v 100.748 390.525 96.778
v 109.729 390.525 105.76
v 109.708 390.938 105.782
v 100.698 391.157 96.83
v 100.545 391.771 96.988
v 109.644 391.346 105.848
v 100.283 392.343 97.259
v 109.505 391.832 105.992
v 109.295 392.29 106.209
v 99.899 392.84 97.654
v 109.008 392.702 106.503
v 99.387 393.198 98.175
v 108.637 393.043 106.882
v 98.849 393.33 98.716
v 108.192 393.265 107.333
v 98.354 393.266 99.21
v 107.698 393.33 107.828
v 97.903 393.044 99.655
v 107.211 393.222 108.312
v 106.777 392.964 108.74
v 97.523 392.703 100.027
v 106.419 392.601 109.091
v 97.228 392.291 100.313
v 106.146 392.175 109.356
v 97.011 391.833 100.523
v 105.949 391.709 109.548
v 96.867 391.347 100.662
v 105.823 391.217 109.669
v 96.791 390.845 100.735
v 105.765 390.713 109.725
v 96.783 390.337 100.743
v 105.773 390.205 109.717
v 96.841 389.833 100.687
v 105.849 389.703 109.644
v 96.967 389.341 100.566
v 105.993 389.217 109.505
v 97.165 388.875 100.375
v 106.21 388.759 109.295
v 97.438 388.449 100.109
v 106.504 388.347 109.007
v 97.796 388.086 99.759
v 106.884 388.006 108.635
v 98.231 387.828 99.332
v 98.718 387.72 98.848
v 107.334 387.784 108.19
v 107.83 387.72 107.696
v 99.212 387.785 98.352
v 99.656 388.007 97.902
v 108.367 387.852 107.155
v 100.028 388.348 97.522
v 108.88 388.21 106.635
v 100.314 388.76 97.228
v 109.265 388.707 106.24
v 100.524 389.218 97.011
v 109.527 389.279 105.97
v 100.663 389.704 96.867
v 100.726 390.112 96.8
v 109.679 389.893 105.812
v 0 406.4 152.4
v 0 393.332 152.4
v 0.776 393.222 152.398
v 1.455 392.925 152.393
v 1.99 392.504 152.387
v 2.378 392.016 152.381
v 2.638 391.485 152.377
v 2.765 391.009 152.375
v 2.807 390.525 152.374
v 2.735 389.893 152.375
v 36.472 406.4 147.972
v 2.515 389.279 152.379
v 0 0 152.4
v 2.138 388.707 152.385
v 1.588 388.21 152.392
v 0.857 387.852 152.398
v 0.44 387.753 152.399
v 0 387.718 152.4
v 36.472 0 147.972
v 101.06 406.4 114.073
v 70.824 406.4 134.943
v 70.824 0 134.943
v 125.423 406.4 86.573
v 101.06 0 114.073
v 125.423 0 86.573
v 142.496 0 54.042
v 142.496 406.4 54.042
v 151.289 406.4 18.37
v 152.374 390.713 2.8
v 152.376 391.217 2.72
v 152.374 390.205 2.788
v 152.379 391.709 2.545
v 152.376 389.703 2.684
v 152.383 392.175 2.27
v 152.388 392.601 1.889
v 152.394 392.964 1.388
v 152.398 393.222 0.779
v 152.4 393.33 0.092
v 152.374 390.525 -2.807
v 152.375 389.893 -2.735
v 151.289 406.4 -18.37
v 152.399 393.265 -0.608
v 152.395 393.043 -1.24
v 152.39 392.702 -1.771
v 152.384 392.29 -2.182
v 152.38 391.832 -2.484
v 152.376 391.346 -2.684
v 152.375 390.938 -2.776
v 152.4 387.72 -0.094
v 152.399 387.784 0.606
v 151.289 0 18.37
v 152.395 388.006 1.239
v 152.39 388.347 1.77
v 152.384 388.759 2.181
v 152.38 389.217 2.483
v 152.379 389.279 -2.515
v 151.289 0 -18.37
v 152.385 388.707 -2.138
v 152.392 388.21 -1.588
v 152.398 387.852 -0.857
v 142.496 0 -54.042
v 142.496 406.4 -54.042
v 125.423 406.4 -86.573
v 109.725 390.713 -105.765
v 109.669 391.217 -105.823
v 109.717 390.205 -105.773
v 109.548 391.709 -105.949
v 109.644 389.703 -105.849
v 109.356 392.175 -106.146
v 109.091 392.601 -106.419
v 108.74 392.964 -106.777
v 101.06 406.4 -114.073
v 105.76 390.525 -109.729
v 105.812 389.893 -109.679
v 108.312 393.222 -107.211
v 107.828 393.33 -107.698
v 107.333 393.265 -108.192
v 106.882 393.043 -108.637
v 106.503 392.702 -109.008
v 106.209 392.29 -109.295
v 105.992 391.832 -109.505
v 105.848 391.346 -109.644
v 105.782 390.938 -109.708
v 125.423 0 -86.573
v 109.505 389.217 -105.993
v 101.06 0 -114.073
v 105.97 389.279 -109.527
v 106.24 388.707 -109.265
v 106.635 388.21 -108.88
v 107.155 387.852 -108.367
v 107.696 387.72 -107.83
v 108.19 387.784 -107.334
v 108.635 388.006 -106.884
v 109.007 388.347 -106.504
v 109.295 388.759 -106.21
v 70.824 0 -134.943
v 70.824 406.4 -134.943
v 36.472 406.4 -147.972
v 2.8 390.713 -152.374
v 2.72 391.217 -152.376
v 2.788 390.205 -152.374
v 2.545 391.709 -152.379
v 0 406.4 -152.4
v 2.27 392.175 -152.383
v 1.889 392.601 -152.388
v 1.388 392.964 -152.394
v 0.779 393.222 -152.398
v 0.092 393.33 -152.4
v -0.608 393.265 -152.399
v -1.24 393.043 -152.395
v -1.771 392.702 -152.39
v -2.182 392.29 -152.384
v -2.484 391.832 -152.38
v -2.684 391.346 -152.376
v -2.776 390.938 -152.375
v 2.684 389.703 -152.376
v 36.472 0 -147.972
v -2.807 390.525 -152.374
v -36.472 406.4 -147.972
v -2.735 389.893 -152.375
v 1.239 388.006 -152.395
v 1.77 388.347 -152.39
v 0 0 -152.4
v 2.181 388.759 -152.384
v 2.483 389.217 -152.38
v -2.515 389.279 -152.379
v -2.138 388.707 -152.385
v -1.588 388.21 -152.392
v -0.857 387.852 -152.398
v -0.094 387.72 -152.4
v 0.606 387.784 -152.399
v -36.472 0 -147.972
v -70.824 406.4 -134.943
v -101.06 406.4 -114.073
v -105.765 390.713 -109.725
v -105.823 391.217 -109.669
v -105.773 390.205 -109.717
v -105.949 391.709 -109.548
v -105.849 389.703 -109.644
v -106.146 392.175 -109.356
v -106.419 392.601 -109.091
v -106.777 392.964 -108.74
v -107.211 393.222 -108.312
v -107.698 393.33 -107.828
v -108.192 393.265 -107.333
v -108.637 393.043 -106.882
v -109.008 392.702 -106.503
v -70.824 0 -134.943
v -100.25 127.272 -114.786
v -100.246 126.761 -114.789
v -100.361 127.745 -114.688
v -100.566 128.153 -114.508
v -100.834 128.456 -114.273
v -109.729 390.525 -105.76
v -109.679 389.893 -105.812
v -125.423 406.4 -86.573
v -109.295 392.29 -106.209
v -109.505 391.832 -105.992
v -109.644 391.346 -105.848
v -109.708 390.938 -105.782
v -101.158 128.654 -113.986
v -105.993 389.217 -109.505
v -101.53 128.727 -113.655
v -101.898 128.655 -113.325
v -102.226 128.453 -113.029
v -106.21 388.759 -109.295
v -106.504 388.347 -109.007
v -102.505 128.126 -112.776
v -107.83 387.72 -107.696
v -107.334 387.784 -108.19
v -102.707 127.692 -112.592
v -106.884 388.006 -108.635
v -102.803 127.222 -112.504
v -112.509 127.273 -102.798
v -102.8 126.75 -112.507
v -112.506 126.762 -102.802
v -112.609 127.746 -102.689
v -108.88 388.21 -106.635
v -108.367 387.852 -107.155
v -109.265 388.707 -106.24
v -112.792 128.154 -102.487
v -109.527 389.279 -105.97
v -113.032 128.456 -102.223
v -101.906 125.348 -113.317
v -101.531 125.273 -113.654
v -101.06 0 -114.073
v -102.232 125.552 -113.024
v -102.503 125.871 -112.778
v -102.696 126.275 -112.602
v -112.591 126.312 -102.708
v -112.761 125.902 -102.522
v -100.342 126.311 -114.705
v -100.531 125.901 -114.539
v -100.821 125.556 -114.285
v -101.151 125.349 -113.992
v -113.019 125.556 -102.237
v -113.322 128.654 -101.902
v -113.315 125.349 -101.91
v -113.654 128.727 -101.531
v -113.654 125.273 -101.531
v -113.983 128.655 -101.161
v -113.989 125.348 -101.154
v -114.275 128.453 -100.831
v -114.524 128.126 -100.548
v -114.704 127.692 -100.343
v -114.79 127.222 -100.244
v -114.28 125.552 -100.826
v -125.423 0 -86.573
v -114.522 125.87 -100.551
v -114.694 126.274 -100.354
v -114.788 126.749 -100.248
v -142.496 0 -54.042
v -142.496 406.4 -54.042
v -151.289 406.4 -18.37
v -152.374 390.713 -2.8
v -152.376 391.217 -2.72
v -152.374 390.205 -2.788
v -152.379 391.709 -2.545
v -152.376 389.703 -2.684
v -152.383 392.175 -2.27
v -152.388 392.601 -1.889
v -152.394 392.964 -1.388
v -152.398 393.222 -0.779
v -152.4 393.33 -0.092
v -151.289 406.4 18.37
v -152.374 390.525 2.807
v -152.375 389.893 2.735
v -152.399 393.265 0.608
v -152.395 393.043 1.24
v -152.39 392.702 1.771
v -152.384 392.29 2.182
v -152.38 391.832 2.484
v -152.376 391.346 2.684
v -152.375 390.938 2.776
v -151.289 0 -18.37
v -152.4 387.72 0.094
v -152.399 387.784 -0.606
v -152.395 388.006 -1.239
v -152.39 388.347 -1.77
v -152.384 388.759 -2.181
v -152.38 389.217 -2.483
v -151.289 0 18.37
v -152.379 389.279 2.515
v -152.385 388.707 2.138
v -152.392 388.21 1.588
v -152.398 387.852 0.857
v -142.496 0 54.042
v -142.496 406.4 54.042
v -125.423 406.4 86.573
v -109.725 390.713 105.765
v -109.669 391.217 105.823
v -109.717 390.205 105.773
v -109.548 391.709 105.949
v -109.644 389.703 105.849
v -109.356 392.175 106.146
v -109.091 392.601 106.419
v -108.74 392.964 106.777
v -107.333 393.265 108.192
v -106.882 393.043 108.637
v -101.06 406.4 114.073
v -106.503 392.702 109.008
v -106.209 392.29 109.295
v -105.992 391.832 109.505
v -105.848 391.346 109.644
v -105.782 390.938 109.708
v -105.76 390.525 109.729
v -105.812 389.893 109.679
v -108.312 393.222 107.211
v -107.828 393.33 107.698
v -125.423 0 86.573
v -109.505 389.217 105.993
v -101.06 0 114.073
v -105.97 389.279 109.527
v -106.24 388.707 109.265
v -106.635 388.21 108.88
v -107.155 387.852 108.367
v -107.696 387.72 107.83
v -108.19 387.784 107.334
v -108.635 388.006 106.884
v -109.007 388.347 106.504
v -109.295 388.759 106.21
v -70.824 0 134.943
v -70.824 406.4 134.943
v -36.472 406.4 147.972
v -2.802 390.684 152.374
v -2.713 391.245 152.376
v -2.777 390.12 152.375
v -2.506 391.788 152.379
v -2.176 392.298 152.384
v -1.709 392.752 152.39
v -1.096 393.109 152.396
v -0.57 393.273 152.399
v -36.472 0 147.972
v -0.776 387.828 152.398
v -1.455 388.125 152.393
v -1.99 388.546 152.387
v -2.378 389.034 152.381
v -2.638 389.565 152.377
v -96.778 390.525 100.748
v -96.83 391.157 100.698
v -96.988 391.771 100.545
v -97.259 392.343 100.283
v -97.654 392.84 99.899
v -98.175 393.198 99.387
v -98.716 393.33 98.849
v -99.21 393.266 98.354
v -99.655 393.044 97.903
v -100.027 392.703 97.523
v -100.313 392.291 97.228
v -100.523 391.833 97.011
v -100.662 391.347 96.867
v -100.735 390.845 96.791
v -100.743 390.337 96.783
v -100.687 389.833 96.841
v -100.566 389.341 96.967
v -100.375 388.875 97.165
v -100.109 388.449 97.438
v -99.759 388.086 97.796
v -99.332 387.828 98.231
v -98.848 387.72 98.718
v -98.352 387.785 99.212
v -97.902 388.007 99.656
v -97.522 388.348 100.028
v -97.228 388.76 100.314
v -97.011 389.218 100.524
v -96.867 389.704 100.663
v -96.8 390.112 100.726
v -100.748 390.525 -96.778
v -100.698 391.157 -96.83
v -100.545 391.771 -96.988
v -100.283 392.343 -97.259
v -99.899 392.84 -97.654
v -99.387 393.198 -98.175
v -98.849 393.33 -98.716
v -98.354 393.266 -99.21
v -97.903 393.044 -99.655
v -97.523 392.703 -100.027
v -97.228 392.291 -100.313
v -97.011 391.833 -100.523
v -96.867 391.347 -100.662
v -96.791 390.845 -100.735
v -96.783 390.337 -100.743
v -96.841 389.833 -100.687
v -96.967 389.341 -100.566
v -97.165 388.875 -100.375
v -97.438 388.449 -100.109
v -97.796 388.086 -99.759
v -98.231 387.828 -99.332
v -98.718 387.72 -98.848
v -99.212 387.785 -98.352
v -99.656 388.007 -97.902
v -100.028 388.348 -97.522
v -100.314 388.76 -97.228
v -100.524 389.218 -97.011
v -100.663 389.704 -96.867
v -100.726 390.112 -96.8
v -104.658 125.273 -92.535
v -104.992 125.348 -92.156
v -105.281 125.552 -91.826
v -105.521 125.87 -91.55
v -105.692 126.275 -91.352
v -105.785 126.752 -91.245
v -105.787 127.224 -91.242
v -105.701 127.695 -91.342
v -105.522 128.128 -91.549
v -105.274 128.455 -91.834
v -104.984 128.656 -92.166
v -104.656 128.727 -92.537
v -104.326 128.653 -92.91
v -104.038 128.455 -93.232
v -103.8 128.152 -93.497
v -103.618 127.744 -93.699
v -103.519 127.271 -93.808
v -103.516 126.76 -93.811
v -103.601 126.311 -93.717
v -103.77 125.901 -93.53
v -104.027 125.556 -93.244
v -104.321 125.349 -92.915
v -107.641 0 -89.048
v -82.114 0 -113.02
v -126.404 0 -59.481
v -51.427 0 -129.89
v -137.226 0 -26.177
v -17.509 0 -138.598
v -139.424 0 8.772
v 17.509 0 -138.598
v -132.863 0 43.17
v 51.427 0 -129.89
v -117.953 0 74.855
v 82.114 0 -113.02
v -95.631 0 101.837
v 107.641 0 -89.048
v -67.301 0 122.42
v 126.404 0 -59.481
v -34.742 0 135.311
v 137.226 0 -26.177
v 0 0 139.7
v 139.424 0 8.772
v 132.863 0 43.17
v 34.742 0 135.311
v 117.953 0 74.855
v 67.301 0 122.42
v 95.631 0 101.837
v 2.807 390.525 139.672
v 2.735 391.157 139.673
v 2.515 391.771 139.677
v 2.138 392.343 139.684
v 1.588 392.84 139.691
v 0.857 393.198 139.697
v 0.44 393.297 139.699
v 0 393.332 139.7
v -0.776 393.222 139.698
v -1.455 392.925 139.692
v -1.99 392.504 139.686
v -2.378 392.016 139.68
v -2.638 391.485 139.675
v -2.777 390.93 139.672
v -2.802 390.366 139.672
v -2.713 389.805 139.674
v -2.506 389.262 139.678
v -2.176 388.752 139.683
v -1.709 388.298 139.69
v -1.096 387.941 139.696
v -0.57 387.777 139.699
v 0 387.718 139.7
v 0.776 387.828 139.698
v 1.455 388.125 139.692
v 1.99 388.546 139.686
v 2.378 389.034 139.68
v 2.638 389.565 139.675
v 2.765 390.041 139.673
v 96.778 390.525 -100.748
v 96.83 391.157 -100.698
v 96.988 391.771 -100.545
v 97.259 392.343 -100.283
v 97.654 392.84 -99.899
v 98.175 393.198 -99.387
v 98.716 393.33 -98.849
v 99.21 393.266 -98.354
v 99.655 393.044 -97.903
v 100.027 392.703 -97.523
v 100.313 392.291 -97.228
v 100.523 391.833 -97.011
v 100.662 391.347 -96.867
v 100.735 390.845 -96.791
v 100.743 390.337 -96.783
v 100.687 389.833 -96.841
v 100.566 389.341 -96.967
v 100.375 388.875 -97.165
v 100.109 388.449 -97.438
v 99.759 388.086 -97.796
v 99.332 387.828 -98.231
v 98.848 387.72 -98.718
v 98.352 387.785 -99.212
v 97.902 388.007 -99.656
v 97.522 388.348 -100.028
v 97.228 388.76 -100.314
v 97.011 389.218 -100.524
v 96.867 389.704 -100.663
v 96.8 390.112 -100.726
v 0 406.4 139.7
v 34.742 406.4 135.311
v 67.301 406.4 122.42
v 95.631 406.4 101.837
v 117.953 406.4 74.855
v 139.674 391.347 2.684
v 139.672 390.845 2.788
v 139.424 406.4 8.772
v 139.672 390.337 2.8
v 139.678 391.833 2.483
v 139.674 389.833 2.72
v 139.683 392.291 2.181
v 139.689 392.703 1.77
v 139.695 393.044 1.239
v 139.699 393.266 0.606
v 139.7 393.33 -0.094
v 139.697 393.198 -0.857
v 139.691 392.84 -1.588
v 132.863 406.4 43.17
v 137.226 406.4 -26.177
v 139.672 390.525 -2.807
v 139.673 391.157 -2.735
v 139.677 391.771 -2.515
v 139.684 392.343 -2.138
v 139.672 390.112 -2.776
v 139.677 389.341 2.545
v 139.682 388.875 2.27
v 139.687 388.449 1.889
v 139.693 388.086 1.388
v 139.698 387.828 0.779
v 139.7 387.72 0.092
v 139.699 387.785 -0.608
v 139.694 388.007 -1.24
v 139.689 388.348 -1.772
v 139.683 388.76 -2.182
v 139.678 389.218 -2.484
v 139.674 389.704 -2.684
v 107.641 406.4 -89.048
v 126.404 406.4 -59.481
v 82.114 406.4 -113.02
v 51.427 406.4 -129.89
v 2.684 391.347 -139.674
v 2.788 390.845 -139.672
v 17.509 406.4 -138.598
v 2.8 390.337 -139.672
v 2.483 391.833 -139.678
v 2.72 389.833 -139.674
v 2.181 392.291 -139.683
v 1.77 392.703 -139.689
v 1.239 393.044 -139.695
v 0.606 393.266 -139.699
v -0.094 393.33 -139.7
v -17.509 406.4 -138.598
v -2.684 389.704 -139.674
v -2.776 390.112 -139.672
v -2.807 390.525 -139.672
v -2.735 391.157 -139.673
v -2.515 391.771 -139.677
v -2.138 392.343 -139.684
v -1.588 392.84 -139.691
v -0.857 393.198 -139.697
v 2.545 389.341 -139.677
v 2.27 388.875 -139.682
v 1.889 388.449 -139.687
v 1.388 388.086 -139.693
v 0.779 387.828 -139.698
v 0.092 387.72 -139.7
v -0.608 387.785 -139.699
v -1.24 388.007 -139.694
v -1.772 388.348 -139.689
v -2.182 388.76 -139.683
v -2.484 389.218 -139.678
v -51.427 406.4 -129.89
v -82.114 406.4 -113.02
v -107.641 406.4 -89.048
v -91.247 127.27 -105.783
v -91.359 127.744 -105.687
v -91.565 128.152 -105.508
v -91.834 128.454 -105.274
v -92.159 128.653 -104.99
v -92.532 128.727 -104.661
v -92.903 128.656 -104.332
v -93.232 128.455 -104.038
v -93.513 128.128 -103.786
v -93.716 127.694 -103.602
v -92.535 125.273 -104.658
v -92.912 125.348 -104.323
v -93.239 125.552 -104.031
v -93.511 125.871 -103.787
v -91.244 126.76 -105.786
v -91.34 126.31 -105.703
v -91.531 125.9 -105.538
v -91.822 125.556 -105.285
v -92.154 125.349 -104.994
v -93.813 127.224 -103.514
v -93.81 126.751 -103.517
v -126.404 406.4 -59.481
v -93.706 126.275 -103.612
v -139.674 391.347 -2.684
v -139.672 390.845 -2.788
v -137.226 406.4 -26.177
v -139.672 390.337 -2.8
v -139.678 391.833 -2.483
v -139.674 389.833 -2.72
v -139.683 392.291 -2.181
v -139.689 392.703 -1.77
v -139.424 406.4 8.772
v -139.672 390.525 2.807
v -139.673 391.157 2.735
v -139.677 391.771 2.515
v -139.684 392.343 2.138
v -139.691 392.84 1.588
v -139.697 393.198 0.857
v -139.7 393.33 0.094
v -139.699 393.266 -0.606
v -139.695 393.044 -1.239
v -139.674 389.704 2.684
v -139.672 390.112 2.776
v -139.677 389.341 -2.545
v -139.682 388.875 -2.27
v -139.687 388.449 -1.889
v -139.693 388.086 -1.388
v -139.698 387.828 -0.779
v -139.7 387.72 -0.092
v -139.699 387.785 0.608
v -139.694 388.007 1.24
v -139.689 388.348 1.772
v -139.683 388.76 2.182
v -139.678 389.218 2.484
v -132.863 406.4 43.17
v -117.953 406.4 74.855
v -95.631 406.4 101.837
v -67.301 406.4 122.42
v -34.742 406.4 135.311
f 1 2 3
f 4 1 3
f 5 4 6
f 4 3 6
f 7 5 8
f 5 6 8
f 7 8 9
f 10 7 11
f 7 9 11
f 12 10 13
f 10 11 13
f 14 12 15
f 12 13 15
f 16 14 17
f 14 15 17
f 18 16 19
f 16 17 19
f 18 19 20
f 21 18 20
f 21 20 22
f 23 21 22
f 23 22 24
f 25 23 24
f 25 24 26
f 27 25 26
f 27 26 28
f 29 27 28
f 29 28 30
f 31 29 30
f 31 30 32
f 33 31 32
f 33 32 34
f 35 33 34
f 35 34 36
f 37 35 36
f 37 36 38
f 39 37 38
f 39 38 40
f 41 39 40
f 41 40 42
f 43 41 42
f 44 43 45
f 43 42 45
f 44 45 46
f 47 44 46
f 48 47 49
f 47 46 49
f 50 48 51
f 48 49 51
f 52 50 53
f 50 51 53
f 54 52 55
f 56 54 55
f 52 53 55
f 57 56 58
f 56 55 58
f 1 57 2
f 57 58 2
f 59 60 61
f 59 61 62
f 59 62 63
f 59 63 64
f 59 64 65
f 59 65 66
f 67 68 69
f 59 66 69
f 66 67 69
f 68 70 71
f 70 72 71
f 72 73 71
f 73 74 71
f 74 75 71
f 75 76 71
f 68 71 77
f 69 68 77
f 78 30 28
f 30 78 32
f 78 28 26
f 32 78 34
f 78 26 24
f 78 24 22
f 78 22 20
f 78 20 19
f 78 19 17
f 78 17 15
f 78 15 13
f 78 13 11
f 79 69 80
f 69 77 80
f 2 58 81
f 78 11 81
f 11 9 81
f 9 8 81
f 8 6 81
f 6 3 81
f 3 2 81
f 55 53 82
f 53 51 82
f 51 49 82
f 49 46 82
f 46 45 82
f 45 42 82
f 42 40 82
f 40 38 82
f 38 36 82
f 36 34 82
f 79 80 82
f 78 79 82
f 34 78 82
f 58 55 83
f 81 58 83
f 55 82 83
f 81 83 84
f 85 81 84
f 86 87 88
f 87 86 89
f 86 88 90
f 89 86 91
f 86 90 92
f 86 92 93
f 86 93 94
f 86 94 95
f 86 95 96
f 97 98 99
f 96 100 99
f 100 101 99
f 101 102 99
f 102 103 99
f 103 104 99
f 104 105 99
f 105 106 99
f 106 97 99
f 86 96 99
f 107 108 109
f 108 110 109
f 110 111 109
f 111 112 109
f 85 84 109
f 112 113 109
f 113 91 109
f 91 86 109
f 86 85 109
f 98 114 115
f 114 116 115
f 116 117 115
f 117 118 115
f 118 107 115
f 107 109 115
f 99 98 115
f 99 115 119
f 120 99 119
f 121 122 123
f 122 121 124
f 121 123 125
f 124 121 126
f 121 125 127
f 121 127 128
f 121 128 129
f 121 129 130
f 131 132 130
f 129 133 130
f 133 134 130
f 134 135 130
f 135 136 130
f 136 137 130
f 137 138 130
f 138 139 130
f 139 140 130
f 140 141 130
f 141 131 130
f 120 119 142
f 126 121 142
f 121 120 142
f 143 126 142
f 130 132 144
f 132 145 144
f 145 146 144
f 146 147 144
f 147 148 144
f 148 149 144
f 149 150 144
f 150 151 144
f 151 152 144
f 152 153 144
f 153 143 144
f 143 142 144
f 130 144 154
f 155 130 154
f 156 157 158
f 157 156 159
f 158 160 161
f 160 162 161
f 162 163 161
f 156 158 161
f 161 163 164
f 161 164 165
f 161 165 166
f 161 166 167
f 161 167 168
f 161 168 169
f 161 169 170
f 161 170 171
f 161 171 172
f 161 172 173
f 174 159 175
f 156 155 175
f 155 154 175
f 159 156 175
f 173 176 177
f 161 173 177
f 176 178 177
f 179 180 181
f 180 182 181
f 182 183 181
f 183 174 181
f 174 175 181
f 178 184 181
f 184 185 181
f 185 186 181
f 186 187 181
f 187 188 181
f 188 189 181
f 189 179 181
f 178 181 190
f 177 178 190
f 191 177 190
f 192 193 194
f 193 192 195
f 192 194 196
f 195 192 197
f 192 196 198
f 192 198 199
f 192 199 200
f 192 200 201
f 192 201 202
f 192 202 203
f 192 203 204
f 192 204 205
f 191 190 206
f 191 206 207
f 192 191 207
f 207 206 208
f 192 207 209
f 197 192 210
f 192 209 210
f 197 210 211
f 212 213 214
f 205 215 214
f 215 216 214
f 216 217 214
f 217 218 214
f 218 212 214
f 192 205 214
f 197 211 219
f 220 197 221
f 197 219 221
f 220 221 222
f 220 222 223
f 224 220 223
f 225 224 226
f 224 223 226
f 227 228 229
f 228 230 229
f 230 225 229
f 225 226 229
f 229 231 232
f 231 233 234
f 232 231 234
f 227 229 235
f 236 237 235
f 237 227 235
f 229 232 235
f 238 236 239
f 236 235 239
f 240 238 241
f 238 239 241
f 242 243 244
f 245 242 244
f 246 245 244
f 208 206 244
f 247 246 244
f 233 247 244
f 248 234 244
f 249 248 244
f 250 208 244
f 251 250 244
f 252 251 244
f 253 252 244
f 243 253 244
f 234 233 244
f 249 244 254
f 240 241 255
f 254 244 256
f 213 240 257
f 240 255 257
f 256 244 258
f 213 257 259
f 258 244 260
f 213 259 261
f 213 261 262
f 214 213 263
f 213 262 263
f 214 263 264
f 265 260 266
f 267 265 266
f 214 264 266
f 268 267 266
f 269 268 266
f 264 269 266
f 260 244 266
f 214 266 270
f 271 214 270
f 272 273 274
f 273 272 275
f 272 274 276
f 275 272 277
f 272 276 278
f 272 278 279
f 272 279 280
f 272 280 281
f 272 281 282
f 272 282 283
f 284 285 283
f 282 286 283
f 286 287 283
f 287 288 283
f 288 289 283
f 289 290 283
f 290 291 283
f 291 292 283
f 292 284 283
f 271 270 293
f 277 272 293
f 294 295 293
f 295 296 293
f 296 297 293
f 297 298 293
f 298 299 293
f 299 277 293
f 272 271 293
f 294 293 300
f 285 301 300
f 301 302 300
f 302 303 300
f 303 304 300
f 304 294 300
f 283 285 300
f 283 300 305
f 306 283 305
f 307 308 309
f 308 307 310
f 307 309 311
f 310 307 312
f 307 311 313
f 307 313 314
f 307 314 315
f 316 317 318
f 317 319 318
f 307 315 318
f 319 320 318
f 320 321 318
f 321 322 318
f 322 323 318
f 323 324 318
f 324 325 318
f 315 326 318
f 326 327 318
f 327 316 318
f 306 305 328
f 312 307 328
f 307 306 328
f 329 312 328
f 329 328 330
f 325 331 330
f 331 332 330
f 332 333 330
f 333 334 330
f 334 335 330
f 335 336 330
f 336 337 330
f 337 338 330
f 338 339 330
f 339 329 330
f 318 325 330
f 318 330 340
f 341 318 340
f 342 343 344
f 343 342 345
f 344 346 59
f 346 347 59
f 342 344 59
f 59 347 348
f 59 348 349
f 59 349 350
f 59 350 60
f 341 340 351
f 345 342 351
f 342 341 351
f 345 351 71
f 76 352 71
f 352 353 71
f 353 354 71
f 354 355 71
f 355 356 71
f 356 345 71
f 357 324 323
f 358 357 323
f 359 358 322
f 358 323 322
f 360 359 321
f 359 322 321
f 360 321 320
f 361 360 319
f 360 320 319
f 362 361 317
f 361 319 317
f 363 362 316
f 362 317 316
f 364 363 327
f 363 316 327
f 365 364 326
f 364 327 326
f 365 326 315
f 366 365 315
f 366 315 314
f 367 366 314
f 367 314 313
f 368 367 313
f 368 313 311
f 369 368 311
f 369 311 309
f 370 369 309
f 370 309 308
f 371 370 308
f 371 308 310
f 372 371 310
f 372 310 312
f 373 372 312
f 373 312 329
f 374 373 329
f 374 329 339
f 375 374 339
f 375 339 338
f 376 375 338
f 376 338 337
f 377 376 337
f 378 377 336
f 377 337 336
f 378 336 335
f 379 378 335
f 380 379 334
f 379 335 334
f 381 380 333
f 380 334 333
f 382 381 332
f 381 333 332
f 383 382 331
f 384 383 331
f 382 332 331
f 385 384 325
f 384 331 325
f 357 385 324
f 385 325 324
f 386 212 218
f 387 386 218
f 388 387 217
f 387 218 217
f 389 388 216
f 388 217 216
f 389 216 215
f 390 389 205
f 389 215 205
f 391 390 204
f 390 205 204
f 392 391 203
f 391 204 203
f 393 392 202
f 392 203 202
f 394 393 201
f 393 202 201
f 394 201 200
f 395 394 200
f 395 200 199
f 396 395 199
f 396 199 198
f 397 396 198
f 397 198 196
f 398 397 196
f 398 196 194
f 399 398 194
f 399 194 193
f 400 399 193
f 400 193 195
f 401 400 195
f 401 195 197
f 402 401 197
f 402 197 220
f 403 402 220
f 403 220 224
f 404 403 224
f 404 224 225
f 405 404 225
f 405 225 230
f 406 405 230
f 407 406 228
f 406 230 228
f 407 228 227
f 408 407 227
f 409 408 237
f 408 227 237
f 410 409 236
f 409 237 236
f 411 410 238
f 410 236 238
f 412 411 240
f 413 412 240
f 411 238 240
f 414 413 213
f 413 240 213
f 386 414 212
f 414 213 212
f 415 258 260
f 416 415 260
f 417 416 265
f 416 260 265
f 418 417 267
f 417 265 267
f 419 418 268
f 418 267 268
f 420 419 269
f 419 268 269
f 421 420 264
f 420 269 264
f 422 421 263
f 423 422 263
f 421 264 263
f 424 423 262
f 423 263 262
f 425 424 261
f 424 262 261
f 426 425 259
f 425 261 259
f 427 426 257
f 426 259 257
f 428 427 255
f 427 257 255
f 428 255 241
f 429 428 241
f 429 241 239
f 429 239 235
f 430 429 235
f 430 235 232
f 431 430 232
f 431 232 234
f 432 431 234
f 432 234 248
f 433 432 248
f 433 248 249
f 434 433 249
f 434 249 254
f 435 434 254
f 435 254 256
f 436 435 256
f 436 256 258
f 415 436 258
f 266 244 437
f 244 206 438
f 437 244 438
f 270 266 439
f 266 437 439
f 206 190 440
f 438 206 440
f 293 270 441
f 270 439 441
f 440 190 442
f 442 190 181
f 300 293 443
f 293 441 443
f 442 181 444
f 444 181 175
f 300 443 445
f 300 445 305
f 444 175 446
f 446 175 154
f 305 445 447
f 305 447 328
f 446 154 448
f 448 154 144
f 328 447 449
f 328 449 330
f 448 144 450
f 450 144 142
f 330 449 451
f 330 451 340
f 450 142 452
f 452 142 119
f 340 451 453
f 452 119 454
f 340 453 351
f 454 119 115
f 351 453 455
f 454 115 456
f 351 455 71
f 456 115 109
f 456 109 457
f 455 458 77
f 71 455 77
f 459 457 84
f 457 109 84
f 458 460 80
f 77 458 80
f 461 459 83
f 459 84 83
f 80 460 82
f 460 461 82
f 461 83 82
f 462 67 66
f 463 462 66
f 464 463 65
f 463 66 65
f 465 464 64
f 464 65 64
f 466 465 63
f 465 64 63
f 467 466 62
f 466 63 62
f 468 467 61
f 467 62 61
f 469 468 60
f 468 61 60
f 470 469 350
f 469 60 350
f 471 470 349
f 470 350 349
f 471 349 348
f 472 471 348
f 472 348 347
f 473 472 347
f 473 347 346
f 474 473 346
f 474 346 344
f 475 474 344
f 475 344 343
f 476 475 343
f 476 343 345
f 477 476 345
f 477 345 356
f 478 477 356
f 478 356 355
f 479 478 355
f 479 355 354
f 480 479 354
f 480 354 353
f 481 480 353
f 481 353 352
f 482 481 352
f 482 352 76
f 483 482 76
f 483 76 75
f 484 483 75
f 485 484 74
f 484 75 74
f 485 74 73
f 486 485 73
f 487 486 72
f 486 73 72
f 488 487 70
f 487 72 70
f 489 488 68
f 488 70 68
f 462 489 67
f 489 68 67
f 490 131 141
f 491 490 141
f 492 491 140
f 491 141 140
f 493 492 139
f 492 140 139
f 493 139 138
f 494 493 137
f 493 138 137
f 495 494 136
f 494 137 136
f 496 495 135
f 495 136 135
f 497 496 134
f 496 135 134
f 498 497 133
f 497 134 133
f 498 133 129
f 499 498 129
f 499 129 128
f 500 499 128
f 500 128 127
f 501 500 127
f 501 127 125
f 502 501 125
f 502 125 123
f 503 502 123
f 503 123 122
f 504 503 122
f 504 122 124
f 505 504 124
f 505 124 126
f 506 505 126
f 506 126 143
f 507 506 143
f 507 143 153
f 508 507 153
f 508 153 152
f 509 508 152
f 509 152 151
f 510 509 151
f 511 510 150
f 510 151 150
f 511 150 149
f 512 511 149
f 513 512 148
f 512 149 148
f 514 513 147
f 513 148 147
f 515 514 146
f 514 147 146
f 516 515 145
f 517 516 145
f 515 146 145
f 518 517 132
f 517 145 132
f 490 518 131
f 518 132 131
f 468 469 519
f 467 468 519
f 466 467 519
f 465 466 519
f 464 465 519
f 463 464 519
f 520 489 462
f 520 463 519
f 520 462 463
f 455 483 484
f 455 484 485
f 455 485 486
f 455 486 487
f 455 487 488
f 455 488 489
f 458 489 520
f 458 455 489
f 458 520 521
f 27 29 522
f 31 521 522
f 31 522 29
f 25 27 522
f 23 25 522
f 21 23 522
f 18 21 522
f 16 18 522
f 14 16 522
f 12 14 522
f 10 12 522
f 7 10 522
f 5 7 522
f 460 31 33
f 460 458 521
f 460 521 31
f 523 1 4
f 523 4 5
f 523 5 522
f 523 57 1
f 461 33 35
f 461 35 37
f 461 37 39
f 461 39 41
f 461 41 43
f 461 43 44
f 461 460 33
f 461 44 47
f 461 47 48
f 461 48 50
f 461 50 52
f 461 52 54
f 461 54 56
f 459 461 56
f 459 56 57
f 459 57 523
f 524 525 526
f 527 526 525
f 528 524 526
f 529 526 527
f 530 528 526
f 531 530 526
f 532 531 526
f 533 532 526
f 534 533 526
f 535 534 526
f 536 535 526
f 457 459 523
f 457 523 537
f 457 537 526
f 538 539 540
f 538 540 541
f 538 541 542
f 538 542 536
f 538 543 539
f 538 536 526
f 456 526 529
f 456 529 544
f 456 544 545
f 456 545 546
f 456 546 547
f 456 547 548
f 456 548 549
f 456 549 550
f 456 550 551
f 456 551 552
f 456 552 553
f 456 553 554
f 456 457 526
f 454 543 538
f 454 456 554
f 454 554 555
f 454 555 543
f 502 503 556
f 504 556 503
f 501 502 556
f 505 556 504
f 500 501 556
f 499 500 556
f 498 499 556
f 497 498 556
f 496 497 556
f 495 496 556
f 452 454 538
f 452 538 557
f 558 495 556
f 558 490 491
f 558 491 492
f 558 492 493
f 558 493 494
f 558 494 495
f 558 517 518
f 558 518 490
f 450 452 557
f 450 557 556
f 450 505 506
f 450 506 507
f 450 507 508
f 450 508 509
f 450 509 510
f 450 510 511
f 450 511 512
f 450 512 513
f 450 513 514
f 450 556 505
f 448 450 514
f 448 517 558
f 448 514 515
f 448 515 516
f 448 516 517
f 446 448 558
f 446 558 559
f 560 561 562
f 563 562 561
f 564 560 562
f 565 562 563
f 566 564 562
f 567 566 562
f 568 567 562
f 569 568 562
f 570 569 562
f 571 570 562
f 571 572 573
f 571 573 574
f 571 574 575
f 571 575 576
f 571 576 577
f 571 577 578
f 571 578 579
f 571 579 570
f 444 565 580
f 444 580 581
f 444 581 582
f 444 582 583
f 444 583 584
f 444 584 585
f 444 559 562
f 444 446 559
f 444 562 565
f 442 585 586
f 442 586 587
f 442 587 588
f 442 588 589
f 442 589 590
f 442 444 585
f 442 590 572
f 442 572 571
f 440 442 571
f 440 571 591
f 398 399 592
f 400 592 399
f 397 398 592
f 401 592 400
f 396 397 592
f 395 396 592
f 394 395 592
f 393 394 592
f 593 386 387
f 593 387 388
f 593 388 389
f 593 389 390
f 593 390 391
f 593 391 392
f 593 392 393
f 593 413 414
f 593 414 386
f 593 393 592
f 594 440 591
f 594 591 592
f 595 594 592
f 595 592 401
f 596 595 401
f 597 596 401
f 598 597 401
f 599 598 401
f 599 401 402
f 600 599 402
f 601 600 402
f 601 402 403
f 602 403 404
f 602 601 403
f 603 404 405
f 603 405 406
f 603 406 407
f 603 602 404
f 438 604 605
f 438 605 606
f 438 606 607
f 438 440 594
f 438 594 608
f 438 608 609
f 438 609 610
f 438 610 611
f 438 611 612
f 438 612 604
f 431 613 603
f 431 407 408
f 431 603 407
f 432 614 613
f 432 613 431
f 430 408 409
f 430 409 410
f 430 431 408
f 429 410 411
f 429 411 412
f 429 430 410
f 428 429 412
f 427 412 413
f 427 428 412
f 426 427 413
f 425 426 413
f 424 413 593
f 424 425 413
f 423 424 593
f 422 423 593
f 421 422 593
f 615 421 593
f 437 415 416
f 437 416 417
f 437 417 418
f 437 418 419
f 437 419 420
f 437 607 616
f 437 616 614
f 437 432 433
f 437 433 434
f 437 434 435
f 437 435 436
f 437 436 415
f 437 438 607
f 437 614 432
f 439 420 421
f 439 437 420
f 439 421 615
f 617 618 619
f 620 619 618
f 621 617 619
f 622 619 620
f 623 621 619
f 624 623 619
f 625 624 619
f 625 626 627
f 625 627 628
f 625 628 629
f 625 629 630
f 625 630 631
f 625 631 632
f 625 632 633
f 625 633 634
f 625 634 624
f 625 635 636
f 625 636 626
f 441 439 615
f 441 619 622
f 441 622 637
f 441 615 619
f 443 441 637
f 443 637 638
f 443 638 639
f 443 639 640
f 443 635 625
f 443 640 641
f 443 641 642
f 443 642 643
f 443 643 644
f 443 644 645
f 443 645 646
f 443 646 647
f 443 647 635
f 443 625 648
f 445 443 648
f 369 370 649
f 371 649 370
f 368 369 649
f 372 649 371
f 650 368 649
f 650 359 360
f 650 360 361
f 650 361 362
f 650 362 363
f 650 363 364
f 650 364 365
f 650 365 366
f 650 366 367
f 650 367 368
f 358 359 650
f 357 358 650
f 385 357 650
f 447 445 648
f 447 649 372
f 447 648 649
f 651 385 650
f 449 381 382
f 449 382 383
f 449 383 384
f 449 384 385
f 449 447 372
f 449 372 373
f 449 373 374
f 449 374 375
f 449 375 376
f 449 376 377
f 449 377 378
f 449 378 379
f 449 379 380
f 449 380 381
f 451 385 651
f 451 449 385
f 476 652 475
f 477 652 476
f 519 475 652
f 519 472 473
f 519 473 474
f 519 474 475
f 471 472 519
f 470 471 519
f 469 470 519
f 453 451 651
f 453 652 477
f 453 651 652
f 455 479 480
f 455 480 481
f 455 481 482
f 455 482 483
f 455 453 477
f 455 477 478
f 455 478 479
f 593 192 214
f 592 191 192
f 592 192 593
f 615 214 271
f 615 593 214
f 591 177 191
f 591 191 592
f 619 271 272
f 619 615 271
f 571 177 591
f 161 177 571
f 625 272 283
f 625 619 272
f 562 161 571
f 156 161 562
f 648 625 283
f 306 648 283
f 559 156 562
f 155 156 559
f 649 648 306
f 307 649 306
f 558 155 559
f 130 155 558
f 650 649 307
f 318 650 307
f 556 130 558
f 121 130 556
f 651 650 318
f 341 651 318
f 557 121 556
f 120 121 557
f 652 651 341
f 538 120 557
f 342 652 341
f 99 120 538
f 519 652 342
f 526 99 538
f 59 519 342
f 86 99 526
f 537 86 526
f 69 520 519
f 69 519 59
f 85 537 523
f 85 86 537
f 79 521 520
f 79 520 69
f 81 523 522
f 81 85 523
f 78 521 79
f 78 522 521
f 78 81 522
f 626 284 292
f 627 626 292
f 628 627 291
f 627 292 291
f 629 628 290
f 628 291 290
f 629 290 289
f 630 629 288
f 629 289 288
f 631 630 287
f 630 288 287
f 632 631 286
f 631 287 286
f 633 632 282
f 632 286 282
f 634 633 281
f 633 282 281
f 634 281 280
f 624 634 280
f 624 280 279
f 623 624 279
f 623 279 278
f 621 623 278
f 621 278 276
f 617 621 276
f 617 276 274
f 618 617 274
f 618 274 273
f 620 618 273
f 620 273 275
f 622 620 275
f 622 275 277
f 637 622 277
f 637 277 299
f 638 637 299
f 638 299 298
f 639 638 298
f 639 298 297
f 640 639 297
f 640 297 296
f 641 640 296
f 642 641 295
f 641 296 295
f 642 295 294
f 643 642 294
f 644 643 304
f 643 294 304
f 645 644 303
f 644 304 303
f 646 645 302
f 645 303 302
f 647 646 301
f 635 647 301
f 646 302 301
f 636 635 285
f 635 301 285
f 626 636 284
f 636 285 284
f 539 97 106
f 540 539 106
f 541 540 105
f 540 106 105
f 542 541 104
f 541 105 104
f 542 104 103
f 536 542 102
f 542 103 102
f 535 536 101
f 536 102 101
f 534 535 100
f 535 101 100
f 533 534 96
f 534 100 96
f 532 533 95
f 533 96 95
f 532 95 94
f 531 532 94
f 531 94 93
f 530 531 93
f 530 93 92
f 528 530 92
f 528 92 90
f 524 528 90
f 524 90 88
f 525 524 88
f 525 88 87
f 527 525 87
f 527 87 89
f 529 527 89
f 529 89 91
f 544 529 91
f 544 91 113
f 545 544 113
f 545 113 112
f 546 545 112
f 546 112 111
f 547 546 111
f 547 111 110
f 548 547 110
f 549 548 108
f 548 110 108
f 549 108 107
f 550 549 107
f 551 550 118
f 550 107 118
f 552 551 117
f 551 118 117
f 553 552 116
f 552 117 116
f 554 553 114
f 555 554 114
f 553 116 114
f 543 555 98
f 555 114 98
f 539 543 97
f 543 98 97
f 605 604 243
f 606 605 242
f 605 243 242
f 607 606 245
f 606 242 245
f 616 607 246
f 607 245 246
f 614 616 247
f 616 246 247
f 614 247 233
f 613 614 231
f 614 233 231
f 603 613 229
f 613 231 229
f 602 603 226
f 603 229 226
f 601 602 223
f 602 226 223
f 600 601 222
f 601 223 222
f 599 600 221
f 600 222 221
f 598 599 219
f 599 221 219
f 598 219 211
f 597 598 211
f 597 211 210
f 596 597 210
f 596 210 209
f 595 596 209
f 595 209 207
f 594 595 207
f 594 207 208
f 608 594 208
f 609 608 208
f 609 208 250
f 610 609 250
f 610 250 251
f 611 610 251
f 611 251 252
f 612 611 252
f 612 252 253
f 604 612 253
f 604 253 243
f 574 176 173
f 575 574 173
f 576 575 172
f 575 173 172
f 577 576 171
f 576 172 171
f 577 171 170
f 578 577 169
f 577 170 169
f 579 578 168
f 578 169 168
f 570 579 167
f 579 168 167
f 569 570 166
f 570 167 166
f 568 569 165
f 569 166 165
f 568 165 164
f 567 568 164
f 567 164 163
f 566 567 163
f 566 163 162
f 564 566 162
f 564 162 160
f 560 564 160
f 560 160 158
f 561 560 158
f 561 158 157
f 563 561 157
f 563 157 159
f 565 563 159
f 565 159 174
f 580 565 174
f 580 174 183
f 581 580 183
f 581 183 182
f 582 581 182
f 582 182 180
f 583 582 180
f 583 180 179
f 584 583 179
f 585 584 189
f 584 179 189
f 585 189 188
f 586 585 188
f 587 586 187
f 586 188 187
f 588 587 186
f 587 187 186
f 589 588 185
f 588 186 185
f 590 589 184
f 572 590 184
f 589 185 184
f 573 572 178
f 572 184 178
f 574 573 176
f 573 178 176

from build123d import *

# Parameters (mm, degrees)
SKETCH1_R                   = 152.4
SKETCH1_R_2                 = 139.7
BOSS_EXTRUDE1_DEPTH         = 406.4
F_10_CLEARANCE_HOLE1_REACH  = 532.368
F_10_CLEARANCE_HOLE1_BORE_R = 2.8067
CIRPATTERN1_COUNT           = 8
F_8_32_TAPPED_HOLE1_REACH   = 550.207
F_8_32_TAPPED_HOLE1_BORE_R  = 1.7272


with BuildPart() as part:
    # Sketch1 → Boss-Extrude1 (new body)
    with BuildSketch(Plane(origin=(0, 0, 0), x_dir=(1, 0, 0), z_dir=(0, 1, 0))):
        with Locations(Location((0, 0, 0), (0, 0, 270))):
            Circle(SKETCH1_R)
        with Locations(Location((0, 0, 0), (0, 0, 270))):
            Circle(SKETCH1_R_2, mode=Mode.SUBTRACT)
    extrude(amount=BOSS_EXTRUDE1_DEPTH)

    # #10 Clearance Hole1 bore → #10 Clearance Hole1 (cut, up to next)
    with BuildSketch(Plane(origin=(152.4, 0, 0), x_dir=(0, 0, -1), z_dir=(1, 0, 0)), mode=Mode.PRIVATE) as f_10_clearance_hole1_sk1:
        with Locations((0, 390.525)):
            Circle(F_10_CLEARANCE_HOLE1_BORE_R)
    f_10_clearance_hole1_tool1 = extrude(f_10_clearance_hole1_sk1.sketch, amount=-F_10_CLEARANCE_HOLE1_REACH, mode=Mode.PRIVATE) & part.part
    f_10_clearance_hole1 = f_10_clearance_hole1_tool1.solids().sort_by_distance((152.4, 390.525, 0))[0]
    add(f_10_clearance_hole1, mode=Mode.SUBTRACT)

    # CirPattern1: #10 Clearance Hole1 ×8 about axis
    cirpattern1_axis = Axis((0, 406.4, 0), (0, 1, 0))
    for i in range(1, CIRPATTERN1_COUNT):
        add(f_10_clearance_hole1.rotate(cirpattern1_axis, i * 360 / CIRPATTERN1_COUNT), mode=Mode.SUBTRACT)

    # #8-32 Tapped Hole1 bore → #8-32 Tapped Hole1 (cut, up to next)
    with BuildSketch(Plane(origin=(-107.763073453, 0, -107.763073453), x_dir=(0, -1, 0), z_dir=(-0.7071067811865464, 0, -0.7071067811865488)), mode=Mode.PRIVATE) as f_8_32_tapped_hole1_sk1:
        with Locations((-127, -8.5725)):
            Circle(F_8_32_TAPPED_HOLE1_BORE_R)
    f_8_32_tapped_hole1_tool1 = extrude(f_8_32_tapped_hole1_sk1.sketch, amount=-F_8_32_TAPPED_HOLE1_REACH, mode=Mode.PRIVATE) & part.part
    # #8-32 Tapped Hole1 bore → #8-32 Tapped Hole1 (cut, up to next)
    with BuildSketch(Plane(origin=(-107.763073453, 0, -107.763073453), x_dir=(0, -1, 0), z_dir=(-0.7071067811865464, 0, -0.7071067811865488)), mode=Mode.PRIVATE) as f_8_32_tapped_hole1_sk2:
        with Locations((-127, 8.5725)):
            Circle(F_8_32_TAPPED_HOLE1_BORE_R)
    f_8_32_tapped_hole1_tool2 = extrude(f_8_32_tapped_hole1_sk2.sketch, amount=-F_8_32_TAPPED_HOLE1_REACH, mode=Mode.PRIVATE) & part.part
    add(f_8_32_tapped_hole1_tool1.solids().sort_by_distance((-101.701401, 127, -113.824746))[0], mode=Mode.SUBTRACT)
    add(f_8_32_tapped_hole1_tool2.solids().sort_by_distance((-113.824746, 127, -101.701401))[0], mode=Mode.SUBTRACT)


solid = part.part
